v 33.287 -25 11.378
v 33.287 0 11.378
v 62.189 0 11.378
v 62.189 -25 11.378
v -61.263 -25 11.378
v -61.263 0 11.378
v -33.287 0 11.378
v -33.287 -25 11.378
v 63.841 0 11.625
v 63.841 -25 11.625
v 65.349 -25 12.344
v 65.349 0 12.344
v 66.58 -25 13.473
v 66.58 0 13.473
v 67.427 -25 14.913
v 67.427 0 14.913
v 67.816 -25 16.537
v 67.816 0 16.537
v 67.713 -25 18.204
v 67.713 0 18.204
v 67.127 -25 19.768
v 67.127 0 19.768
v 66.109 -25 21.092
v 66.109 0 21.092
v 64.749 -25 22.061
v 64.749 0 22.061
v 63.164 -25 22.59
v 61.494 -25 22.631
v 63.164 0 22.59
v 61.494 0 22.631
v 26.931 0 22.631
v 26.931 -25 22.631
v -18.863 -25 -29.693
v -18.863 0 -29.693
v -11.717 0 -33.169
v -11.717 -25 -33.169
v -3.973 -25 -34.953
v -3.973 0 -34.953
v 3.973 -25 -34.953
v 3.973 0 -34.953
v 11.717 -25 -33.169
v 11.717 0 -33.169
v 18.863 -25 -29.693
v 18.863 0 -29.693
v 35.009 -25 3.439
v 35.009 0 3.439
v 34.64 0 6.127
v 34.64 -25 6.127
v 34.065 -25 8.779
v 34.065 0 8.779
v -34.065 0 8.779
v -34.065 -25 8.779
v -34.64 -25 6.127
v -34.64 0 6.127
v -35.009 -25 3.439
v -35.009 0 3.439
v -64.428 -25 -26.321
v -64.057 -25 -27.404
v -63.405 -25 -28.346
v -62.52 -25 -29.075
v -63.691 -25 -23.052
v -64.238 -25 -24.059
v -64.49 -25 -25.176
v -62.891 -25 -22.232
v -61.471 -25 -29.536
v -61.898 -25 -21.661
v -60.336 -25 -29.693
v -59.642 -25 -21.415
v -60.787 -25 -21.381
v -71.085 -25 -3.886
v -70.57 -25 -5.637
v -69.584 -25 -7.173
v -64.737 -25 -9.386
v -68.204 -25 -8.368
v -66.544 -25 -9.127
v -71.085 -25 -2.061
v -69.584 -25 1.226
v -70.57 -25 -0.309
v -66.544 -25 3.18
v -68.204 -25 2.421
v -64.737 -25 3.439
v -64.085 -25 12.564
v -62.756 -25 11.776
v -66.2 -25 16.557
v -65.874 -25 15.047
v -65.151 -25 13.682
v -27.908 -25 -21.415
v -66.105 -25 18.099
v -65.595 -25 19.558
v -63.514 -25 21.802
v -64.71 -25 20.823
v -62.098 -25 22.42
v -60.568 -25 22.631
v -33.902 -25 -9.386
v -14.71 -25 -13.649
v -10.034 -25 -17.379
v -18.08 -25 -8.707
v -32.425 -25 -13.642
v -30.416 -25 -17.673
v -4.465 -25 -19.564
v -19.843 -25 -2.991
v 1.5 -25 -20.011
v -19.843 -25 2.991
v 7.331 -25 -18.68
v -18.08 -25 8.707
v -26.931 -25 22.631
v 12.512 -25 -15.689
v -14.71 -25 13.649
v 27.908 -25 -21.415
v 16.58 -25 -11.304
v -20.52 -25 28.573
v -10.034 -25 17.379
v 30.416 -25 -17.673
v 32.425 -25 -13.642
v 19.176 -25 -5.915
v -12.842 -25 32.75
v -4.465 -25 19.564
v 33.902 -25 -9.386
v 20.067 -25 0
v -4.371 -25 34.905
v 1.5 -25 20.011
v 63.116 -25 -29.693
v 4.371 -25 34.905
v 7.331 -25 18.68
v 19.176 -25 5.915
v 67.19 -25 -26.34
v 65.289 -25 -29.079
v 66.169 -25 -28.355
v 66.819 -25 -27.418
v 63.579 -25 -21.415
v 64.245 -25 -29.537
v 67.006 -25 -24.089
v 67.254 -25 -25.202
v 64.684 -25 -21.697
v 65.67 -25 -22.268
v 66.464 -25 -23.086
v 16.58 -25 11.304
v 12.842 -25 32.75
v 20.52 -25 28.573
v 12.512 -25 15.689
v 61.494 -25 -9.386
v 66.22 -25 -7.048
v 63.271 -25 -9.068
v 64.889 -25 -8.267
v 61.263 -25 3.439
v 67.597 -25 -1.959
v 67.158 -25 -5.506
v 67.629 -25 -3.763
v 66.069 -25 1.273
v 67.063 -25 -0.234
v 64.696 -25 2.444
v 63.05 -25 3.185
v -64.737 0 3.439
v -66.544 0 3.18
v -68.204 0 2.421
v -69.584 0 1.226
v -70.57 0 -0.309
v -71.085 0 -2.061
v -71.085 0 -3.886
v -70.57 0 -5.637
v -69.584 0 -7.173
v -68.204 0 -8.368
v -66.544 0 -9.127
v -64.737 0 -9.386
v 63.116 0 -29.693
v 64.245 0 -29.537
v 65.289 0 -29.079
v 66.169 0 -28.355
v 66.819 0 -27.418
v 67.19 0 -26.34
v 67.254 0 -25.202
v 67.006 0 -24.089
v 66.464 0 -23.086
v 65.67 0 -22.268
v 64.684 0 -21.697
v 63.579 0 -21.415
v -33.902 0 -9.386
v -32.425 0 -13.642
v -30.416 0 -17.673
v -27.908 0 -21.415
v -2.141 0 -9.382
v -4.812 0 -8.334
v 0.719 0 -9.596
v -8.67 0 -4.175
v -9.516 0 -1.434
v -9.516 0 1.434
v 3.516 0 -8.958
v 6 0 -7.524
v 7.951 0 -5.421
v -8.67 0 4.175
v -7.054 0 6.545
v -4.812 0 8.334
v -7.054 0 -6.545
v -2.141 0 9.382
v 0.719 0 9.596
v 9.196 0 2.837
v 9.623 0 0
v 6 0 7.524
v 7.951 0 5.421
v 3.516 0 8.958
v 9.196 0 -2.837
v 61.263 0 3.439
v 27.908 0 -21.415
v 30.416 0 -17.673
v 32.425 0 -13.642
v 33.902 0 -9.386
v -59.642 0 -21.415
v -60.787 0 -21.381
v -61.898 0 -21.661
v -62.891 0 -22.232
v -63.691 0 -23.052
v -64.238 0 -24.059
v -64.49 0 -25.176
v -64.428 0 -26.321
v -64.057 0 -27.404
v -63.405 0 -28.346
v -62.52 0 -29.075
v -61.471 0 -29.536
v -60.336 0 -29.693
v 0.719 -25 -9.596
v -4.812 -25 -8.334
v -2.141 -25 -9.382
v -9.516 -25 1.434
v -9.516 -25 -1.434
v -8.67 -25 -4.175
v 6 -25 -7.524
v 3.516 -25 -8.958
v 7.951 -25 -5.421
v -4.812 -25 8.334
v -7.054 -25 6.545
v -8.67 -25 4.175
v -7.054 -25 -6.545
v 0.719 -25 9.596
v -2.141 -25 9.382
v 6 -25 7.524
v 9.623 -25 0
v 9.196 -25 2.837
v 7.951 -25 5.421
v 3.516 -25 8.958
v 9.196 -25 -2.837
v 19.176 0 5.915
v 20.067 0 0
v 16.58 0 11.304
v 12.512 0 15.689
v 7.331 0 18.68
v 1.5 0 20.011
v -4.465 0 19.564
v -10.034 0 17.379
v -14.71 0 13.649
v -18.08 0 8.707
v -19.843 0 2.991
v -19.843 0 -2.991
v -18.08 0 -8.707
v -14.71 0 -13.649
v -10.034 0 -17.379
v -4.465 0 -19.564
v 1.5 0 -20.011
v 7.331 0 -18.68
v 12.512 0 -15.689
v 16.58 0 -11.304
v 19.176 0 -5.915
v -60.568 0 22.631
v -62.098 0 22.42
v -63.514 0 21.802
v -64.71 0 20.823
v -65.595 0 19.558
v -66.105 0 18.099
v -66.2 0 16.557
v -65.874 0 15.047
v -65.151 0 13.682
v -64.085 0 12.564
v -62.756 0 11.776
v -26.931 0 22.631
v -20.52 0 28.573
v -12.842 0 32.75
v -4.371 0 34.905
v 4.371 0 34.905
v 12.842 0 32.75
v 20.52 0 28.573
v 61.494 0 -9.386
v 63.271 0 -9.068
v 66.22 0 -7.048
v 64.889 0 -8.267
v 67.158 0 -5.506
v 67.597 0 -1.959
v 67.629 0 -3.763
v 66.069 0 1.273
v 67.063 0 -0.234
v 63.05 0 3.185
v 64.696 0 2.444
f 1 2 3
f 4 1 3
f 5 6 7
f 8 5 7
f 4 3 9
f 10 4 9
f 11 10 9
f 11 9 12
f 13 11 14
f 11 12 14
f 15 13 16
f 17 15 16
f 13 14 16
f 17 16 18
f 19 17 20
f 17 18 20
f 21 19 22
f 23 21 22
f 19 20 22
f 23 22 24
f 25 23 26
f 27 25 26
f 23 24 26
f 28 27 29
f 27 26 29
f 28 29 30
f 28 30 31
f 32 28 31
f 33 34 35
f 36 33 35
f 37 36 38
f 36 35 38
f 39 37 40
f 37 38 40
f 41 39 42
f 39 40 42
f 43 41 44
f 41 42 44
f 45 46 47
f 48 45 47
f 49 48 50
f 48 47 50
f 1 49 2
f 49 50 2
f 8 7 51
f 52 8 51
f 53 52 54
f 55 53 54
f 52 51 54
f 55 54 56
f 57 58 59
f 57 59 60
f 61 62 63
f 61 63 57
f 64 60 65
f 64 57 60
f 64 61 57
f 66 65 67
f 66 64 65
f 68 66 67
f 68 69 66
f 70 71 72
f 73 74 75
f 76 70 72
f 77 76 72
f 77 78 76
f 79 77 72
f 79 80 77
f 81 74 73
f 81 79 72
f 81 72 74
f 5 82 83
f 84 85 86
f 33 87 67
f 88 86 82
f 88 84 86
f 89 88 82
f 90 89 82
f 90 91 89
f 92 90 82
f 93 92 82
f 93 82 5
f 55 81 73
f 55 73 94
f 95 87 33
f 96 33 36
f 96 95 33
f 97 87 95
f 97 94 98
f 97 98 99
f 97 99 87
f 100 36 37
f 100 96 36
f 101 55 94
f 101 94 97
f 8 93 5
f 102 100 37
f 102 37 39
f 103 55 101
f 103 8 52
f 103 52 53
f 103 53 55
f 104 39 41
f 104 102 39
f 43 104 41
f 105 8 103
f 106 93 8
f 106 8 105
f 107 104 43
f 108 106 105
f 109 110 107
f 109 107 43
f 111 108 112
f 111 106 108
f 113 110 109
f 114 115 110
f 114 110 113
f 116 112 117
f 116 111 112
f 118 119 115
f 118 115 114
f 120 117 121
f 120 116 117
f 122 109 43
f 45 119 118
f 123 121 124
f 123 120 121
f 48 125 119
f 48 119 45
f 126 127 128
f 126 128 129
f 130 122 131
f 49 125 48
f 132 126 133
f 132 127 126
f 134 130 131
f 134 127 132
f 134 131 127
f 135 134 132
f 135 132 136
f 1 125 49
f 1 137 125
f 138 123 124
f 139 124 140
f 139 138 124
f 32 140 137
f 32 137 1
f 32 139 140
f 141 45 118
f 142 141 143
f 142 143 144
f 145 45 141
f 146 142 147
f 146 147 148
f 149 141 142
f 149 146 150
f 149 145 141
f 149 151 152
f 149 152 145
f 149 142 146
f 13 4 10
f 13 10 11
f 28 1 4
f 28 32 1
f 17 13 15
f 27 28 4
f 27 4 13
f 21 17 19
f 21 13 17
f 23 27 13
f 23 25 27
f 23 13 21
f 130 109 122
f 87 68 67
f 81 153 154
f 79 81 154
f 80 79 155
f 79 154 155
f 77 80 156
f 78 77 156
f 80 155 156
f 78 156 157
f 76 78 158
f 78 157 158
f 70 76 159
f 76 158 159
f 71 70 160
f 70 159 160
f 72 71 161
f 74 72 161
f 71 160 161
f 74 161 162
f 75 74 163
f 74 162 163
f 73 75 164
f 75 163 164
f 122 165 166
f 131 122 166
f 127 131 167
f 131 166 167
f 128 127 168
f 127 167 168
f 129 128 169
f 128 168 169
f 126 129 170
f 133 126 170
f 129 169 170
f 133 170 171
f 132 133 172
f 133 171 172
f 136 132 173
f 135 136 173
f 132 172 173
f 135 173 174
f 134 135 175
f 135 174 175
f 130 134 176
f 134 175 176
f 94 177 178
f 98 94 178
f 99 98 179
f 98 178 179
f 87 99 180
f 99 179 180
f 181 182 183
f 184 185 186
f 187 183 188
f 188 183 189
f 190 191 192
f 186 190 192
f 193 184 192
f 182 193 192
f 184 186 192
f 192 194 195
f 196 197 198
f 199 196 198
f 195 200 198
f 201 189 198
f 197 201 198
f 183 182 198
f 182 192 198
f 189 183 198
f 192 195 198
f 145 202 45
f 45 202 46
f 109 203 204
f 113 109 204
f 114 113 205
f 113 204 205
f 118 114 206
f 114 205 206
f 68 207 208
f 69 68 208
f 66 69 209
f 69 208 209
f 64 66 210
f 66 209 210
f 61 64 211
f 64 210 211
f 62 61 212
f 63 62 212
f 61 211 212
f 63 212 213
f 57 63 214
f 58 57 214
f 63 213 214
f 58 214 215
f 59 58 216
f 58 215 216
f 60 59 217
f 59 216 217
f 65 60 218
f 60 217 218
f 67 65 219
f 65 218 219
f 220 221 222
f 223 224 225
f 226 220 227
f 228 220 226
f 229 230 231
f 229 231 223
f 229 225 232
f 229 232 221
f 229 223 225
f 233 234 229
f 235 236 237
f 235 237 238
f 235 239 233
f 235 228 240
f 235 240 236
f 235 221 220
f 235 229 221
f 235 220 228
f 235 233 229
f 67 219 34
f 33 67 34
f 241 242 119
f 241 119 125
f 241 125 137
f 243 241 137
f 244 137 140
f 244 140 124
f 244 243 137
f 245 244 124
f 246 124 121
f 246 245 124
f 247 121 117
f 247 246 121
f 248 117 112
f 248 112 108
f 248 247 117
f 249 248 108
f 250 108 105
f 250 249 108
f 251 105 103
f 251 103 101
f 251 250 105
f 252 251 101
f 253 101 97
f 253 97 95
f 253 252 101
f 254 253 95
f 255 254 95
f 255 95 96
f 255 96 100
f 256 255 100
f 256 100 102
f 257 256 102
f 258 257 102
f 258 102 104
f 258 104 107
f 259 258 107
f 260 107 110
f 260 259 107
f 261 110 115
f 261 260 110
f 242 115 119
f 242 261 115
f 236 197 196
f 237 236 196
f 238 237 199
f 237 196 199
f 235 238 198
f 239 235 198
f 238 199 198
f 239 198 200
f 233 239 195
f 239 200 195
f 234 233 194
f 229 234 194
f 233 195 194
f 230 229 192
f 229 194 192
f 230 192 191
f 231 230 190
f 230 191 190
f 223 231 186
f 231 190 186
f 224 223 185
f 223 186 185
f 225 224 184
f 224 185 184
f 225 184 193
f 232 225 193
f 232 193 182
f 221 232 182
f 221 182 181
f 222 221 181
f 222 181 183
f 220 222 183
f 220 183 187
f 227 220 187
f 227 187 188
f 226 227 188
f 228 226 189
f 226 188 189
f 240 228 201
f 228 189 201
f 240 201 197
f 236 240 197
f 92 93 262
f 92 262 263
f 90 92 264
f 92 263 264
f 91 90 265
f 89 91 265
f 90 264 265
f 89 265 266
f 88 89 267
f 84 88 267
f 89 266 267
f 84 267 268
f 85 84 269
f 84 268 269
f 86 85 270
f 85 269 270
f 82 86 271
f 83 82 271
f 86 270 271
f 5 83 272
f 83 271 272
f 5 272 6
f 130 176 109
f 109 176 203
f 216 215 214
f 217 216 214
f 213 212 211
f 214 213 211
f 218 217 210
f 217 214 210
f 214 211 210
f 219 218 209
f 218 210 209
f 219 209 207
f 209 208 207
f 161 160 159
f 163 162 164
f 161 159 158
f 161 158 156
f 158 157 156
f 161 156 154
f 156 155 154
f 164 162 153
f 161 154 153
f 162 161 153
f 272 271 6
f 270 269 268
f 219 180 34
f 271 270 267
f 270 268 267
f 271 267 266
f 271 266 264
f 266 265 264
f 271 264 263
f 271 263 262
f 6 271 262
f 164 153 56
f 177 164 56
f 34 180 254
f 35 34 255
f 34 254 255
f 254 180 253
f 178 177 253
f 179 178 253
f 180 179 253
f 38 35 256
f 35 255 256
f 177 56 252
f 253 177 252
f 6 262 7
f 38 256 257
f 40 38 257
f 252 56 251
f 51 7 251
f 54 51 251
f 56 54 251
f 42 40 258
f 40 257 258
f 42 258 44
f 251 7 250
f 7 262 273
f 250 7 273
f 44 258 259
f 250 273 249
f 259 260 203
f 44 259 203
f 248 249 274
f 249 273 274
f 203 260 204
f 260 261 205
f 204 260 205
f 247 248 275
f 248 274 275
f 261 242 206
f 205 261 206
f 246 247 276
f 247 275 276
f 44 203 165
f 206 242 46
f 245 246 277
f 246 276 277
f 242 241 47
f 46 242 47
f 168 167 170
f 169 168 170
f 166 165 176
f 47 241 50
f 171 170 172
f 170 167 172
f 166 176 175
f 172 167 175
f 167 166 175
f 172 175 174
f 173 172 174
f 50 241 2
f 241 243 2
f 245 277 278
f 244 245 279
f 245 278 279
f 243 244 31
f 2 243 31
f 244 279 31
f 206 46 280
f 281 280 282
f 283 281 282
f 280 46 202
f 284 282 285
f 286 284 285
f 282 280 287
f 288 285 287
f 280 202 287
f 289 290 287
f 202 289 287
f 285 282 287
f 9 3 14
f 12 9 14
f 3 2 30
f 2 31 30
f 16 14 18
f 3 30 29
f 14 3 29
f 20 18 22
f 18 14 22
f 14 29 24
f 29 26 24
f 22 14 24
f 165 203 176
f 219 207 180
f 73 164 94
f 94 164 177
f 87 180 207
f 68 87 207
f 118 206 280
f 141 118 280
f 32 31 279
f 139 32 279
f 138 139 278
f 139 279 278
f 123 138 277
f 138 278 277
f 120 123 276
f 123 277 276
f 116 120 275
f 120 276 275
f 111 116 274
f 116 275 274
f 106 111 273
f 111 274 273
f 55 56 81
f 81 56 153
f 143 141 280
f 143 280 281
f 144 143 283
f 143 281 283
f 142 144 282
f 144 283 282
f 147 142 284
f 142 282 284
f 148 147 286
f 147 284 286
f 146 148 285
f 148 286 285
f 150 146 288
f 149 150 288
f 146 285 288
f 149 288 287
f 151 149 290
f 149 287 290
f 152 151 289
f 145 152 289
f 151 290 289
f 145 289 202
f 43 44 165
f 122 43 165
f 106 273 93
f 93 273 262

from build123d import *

# Parameters (mm, degrees)
F0_R     = 20.067034
F0_R_2   = 9.623289
F1_DEPTH = 25


with BuildPart() as f1:
    # F0 (on Front) → F1 (new body)
    with BuildSketch(Plane.XZ):
        with BuildLine():
            ThreePointArc((33.902498, -9.386339), (34.857571, -4.736294), (35.177873, 0))
            ThreePointArc((35.177873, 0), (35.135712, 1.721771), (35.00933, 3.439415))
            ThreePointArc((35.00933, 3.439415), (34.378067, 7.458638), (33.28696, 11.378093))
            ThreePointArc((33.28696, 11.378093), (30.630425, 17.299128), (26.931429, 22.631413))
            ThreePointArc((26.931429, 22.631413), (0, 35.177873), (-26.931429, 22.631413))
            ThreePointArc((-26.931429, 22.631413), (-30.630425, 17.299128), (-33.28696, 11.378093))
            ThreePointArc((-33.28696, 11.378093), (-34.378067, 7.458638), (-35.00933, 3.439415))
            ThreePointArc((-35.00933, 3.439415), (-35.04761, -3.024524), (-33.902498, -9.386339))
            ThreePointArc((-33.902498, -9.386339), (-31.485155, -15.689734), (-27.908218, -21.415278))
            ThreePointArc((-27.908218, -21.415278), (-23.748844, -25.951399), (-18.862568, -29.693203))
            ThreePointArc((-18.862568, -29.693203), (0, -35.177873), (18.862568, -29.693203))
            ThreePointArc((18.862568, -29.693203), (23.748844, -25.951399), (27.908218, -21.415278))
            ThreePointArc((27.908218, -21.415278), (31.485155, -15.689734), (33.902498, -9.386339))
        make_face()
        Circle(F0_R, mode=Mode.SUBTRACT)
        with BuildLine():
            ThreePointArc((35.00933, 3.439415), (35.135712, 1.721771), (35.177873, 0))
            ThreePointArc((35.177873, 0), (34.857571, -4.736294), (33.902498, -9.386339))
            Line((33.902498, -9.386339), (61.494485, -9.386339))
            ThreePointArc((61.494485, -9.386339), (67.676795, -2.859728), (61.262872, 3.439415))
            Line((61.262872, 3.439415), (35.00933, 3.439415))
        make_face()
        with BuildLine():
            ThreePointArc((26.931429, 22.631413), (30.630425, 17.299128), (33.28696, 11.378093))
            Line((33.28696, 11.378093), (62.189341, 11.378093))
            ThreePointArc((62.189341, 11.378093), (67.826717, 17.374296), (61.494485, 22.631413))
            Line((61.494485, 22.631413), (26.931429, 22.631413))
        make_face()
        with BuildLine():
            Line((63.579045, -21.415278), (27.908218, -21.415278))
            ThreePointArc((27.908218, -21.415278), (23.748844, -25.951399), (18.862568, -29.693203))
            Line((18.862568, -29.693203), (63.115813, -29.693203))
            ThreePointArc((63.115813, -29.693203), (67.261251, -25.773257), (63.579045, -21.415278))
        make_face()
        with BuildLine():
            ThreePointArc((-33.28696, 11.378093), (-30.630425, 17.299128), (-26.931429, 22.631413))
            Line((-26.931429, 22.631413), (-60.568016, 22.631413))
            ThreePointArc((-60.568016, 22.631413), (-66.205392, 17.33139), (-61.262872, 11.378093))
            Line((-61.262872, 11.378093), (-33.28696, 11.378093))
        make_face()
        with BuildLine():
            Line((-60.336404, -29.693203), (-18.862568, -29.693203))
            ThreePointArc((-18.862568, -29.693203), (-23.748844, -25.951399), (-27.908218, -21.415278))
            Line((-27.908218, -21.415278), (-59.641551, -21.415278))
            ThreePointArc((-59.641551, -21.415278), (-64.489923, -25.176428), (-60.336404, -29.693203))
        make_face()
        with BuildLine():
            ThreePointArc((-33.902498, -9.386339), (-35.04761, -3.024524), (-35.00933, 3.439415))
            Line((-35.00933, 3.439415), (-64.737134, 3.439415))
            ThreePointArc((-64.737134, 3.439415), (-71.150011, -2.973462), (-64.737134, -9.386339))
            Line((-64.737134, -9.386339), (-33.902498, -9.386339))
        make_face()
        Circle(F0_R_2)
    extrude(amount=F1_DEPTH)


solid = f1.part
